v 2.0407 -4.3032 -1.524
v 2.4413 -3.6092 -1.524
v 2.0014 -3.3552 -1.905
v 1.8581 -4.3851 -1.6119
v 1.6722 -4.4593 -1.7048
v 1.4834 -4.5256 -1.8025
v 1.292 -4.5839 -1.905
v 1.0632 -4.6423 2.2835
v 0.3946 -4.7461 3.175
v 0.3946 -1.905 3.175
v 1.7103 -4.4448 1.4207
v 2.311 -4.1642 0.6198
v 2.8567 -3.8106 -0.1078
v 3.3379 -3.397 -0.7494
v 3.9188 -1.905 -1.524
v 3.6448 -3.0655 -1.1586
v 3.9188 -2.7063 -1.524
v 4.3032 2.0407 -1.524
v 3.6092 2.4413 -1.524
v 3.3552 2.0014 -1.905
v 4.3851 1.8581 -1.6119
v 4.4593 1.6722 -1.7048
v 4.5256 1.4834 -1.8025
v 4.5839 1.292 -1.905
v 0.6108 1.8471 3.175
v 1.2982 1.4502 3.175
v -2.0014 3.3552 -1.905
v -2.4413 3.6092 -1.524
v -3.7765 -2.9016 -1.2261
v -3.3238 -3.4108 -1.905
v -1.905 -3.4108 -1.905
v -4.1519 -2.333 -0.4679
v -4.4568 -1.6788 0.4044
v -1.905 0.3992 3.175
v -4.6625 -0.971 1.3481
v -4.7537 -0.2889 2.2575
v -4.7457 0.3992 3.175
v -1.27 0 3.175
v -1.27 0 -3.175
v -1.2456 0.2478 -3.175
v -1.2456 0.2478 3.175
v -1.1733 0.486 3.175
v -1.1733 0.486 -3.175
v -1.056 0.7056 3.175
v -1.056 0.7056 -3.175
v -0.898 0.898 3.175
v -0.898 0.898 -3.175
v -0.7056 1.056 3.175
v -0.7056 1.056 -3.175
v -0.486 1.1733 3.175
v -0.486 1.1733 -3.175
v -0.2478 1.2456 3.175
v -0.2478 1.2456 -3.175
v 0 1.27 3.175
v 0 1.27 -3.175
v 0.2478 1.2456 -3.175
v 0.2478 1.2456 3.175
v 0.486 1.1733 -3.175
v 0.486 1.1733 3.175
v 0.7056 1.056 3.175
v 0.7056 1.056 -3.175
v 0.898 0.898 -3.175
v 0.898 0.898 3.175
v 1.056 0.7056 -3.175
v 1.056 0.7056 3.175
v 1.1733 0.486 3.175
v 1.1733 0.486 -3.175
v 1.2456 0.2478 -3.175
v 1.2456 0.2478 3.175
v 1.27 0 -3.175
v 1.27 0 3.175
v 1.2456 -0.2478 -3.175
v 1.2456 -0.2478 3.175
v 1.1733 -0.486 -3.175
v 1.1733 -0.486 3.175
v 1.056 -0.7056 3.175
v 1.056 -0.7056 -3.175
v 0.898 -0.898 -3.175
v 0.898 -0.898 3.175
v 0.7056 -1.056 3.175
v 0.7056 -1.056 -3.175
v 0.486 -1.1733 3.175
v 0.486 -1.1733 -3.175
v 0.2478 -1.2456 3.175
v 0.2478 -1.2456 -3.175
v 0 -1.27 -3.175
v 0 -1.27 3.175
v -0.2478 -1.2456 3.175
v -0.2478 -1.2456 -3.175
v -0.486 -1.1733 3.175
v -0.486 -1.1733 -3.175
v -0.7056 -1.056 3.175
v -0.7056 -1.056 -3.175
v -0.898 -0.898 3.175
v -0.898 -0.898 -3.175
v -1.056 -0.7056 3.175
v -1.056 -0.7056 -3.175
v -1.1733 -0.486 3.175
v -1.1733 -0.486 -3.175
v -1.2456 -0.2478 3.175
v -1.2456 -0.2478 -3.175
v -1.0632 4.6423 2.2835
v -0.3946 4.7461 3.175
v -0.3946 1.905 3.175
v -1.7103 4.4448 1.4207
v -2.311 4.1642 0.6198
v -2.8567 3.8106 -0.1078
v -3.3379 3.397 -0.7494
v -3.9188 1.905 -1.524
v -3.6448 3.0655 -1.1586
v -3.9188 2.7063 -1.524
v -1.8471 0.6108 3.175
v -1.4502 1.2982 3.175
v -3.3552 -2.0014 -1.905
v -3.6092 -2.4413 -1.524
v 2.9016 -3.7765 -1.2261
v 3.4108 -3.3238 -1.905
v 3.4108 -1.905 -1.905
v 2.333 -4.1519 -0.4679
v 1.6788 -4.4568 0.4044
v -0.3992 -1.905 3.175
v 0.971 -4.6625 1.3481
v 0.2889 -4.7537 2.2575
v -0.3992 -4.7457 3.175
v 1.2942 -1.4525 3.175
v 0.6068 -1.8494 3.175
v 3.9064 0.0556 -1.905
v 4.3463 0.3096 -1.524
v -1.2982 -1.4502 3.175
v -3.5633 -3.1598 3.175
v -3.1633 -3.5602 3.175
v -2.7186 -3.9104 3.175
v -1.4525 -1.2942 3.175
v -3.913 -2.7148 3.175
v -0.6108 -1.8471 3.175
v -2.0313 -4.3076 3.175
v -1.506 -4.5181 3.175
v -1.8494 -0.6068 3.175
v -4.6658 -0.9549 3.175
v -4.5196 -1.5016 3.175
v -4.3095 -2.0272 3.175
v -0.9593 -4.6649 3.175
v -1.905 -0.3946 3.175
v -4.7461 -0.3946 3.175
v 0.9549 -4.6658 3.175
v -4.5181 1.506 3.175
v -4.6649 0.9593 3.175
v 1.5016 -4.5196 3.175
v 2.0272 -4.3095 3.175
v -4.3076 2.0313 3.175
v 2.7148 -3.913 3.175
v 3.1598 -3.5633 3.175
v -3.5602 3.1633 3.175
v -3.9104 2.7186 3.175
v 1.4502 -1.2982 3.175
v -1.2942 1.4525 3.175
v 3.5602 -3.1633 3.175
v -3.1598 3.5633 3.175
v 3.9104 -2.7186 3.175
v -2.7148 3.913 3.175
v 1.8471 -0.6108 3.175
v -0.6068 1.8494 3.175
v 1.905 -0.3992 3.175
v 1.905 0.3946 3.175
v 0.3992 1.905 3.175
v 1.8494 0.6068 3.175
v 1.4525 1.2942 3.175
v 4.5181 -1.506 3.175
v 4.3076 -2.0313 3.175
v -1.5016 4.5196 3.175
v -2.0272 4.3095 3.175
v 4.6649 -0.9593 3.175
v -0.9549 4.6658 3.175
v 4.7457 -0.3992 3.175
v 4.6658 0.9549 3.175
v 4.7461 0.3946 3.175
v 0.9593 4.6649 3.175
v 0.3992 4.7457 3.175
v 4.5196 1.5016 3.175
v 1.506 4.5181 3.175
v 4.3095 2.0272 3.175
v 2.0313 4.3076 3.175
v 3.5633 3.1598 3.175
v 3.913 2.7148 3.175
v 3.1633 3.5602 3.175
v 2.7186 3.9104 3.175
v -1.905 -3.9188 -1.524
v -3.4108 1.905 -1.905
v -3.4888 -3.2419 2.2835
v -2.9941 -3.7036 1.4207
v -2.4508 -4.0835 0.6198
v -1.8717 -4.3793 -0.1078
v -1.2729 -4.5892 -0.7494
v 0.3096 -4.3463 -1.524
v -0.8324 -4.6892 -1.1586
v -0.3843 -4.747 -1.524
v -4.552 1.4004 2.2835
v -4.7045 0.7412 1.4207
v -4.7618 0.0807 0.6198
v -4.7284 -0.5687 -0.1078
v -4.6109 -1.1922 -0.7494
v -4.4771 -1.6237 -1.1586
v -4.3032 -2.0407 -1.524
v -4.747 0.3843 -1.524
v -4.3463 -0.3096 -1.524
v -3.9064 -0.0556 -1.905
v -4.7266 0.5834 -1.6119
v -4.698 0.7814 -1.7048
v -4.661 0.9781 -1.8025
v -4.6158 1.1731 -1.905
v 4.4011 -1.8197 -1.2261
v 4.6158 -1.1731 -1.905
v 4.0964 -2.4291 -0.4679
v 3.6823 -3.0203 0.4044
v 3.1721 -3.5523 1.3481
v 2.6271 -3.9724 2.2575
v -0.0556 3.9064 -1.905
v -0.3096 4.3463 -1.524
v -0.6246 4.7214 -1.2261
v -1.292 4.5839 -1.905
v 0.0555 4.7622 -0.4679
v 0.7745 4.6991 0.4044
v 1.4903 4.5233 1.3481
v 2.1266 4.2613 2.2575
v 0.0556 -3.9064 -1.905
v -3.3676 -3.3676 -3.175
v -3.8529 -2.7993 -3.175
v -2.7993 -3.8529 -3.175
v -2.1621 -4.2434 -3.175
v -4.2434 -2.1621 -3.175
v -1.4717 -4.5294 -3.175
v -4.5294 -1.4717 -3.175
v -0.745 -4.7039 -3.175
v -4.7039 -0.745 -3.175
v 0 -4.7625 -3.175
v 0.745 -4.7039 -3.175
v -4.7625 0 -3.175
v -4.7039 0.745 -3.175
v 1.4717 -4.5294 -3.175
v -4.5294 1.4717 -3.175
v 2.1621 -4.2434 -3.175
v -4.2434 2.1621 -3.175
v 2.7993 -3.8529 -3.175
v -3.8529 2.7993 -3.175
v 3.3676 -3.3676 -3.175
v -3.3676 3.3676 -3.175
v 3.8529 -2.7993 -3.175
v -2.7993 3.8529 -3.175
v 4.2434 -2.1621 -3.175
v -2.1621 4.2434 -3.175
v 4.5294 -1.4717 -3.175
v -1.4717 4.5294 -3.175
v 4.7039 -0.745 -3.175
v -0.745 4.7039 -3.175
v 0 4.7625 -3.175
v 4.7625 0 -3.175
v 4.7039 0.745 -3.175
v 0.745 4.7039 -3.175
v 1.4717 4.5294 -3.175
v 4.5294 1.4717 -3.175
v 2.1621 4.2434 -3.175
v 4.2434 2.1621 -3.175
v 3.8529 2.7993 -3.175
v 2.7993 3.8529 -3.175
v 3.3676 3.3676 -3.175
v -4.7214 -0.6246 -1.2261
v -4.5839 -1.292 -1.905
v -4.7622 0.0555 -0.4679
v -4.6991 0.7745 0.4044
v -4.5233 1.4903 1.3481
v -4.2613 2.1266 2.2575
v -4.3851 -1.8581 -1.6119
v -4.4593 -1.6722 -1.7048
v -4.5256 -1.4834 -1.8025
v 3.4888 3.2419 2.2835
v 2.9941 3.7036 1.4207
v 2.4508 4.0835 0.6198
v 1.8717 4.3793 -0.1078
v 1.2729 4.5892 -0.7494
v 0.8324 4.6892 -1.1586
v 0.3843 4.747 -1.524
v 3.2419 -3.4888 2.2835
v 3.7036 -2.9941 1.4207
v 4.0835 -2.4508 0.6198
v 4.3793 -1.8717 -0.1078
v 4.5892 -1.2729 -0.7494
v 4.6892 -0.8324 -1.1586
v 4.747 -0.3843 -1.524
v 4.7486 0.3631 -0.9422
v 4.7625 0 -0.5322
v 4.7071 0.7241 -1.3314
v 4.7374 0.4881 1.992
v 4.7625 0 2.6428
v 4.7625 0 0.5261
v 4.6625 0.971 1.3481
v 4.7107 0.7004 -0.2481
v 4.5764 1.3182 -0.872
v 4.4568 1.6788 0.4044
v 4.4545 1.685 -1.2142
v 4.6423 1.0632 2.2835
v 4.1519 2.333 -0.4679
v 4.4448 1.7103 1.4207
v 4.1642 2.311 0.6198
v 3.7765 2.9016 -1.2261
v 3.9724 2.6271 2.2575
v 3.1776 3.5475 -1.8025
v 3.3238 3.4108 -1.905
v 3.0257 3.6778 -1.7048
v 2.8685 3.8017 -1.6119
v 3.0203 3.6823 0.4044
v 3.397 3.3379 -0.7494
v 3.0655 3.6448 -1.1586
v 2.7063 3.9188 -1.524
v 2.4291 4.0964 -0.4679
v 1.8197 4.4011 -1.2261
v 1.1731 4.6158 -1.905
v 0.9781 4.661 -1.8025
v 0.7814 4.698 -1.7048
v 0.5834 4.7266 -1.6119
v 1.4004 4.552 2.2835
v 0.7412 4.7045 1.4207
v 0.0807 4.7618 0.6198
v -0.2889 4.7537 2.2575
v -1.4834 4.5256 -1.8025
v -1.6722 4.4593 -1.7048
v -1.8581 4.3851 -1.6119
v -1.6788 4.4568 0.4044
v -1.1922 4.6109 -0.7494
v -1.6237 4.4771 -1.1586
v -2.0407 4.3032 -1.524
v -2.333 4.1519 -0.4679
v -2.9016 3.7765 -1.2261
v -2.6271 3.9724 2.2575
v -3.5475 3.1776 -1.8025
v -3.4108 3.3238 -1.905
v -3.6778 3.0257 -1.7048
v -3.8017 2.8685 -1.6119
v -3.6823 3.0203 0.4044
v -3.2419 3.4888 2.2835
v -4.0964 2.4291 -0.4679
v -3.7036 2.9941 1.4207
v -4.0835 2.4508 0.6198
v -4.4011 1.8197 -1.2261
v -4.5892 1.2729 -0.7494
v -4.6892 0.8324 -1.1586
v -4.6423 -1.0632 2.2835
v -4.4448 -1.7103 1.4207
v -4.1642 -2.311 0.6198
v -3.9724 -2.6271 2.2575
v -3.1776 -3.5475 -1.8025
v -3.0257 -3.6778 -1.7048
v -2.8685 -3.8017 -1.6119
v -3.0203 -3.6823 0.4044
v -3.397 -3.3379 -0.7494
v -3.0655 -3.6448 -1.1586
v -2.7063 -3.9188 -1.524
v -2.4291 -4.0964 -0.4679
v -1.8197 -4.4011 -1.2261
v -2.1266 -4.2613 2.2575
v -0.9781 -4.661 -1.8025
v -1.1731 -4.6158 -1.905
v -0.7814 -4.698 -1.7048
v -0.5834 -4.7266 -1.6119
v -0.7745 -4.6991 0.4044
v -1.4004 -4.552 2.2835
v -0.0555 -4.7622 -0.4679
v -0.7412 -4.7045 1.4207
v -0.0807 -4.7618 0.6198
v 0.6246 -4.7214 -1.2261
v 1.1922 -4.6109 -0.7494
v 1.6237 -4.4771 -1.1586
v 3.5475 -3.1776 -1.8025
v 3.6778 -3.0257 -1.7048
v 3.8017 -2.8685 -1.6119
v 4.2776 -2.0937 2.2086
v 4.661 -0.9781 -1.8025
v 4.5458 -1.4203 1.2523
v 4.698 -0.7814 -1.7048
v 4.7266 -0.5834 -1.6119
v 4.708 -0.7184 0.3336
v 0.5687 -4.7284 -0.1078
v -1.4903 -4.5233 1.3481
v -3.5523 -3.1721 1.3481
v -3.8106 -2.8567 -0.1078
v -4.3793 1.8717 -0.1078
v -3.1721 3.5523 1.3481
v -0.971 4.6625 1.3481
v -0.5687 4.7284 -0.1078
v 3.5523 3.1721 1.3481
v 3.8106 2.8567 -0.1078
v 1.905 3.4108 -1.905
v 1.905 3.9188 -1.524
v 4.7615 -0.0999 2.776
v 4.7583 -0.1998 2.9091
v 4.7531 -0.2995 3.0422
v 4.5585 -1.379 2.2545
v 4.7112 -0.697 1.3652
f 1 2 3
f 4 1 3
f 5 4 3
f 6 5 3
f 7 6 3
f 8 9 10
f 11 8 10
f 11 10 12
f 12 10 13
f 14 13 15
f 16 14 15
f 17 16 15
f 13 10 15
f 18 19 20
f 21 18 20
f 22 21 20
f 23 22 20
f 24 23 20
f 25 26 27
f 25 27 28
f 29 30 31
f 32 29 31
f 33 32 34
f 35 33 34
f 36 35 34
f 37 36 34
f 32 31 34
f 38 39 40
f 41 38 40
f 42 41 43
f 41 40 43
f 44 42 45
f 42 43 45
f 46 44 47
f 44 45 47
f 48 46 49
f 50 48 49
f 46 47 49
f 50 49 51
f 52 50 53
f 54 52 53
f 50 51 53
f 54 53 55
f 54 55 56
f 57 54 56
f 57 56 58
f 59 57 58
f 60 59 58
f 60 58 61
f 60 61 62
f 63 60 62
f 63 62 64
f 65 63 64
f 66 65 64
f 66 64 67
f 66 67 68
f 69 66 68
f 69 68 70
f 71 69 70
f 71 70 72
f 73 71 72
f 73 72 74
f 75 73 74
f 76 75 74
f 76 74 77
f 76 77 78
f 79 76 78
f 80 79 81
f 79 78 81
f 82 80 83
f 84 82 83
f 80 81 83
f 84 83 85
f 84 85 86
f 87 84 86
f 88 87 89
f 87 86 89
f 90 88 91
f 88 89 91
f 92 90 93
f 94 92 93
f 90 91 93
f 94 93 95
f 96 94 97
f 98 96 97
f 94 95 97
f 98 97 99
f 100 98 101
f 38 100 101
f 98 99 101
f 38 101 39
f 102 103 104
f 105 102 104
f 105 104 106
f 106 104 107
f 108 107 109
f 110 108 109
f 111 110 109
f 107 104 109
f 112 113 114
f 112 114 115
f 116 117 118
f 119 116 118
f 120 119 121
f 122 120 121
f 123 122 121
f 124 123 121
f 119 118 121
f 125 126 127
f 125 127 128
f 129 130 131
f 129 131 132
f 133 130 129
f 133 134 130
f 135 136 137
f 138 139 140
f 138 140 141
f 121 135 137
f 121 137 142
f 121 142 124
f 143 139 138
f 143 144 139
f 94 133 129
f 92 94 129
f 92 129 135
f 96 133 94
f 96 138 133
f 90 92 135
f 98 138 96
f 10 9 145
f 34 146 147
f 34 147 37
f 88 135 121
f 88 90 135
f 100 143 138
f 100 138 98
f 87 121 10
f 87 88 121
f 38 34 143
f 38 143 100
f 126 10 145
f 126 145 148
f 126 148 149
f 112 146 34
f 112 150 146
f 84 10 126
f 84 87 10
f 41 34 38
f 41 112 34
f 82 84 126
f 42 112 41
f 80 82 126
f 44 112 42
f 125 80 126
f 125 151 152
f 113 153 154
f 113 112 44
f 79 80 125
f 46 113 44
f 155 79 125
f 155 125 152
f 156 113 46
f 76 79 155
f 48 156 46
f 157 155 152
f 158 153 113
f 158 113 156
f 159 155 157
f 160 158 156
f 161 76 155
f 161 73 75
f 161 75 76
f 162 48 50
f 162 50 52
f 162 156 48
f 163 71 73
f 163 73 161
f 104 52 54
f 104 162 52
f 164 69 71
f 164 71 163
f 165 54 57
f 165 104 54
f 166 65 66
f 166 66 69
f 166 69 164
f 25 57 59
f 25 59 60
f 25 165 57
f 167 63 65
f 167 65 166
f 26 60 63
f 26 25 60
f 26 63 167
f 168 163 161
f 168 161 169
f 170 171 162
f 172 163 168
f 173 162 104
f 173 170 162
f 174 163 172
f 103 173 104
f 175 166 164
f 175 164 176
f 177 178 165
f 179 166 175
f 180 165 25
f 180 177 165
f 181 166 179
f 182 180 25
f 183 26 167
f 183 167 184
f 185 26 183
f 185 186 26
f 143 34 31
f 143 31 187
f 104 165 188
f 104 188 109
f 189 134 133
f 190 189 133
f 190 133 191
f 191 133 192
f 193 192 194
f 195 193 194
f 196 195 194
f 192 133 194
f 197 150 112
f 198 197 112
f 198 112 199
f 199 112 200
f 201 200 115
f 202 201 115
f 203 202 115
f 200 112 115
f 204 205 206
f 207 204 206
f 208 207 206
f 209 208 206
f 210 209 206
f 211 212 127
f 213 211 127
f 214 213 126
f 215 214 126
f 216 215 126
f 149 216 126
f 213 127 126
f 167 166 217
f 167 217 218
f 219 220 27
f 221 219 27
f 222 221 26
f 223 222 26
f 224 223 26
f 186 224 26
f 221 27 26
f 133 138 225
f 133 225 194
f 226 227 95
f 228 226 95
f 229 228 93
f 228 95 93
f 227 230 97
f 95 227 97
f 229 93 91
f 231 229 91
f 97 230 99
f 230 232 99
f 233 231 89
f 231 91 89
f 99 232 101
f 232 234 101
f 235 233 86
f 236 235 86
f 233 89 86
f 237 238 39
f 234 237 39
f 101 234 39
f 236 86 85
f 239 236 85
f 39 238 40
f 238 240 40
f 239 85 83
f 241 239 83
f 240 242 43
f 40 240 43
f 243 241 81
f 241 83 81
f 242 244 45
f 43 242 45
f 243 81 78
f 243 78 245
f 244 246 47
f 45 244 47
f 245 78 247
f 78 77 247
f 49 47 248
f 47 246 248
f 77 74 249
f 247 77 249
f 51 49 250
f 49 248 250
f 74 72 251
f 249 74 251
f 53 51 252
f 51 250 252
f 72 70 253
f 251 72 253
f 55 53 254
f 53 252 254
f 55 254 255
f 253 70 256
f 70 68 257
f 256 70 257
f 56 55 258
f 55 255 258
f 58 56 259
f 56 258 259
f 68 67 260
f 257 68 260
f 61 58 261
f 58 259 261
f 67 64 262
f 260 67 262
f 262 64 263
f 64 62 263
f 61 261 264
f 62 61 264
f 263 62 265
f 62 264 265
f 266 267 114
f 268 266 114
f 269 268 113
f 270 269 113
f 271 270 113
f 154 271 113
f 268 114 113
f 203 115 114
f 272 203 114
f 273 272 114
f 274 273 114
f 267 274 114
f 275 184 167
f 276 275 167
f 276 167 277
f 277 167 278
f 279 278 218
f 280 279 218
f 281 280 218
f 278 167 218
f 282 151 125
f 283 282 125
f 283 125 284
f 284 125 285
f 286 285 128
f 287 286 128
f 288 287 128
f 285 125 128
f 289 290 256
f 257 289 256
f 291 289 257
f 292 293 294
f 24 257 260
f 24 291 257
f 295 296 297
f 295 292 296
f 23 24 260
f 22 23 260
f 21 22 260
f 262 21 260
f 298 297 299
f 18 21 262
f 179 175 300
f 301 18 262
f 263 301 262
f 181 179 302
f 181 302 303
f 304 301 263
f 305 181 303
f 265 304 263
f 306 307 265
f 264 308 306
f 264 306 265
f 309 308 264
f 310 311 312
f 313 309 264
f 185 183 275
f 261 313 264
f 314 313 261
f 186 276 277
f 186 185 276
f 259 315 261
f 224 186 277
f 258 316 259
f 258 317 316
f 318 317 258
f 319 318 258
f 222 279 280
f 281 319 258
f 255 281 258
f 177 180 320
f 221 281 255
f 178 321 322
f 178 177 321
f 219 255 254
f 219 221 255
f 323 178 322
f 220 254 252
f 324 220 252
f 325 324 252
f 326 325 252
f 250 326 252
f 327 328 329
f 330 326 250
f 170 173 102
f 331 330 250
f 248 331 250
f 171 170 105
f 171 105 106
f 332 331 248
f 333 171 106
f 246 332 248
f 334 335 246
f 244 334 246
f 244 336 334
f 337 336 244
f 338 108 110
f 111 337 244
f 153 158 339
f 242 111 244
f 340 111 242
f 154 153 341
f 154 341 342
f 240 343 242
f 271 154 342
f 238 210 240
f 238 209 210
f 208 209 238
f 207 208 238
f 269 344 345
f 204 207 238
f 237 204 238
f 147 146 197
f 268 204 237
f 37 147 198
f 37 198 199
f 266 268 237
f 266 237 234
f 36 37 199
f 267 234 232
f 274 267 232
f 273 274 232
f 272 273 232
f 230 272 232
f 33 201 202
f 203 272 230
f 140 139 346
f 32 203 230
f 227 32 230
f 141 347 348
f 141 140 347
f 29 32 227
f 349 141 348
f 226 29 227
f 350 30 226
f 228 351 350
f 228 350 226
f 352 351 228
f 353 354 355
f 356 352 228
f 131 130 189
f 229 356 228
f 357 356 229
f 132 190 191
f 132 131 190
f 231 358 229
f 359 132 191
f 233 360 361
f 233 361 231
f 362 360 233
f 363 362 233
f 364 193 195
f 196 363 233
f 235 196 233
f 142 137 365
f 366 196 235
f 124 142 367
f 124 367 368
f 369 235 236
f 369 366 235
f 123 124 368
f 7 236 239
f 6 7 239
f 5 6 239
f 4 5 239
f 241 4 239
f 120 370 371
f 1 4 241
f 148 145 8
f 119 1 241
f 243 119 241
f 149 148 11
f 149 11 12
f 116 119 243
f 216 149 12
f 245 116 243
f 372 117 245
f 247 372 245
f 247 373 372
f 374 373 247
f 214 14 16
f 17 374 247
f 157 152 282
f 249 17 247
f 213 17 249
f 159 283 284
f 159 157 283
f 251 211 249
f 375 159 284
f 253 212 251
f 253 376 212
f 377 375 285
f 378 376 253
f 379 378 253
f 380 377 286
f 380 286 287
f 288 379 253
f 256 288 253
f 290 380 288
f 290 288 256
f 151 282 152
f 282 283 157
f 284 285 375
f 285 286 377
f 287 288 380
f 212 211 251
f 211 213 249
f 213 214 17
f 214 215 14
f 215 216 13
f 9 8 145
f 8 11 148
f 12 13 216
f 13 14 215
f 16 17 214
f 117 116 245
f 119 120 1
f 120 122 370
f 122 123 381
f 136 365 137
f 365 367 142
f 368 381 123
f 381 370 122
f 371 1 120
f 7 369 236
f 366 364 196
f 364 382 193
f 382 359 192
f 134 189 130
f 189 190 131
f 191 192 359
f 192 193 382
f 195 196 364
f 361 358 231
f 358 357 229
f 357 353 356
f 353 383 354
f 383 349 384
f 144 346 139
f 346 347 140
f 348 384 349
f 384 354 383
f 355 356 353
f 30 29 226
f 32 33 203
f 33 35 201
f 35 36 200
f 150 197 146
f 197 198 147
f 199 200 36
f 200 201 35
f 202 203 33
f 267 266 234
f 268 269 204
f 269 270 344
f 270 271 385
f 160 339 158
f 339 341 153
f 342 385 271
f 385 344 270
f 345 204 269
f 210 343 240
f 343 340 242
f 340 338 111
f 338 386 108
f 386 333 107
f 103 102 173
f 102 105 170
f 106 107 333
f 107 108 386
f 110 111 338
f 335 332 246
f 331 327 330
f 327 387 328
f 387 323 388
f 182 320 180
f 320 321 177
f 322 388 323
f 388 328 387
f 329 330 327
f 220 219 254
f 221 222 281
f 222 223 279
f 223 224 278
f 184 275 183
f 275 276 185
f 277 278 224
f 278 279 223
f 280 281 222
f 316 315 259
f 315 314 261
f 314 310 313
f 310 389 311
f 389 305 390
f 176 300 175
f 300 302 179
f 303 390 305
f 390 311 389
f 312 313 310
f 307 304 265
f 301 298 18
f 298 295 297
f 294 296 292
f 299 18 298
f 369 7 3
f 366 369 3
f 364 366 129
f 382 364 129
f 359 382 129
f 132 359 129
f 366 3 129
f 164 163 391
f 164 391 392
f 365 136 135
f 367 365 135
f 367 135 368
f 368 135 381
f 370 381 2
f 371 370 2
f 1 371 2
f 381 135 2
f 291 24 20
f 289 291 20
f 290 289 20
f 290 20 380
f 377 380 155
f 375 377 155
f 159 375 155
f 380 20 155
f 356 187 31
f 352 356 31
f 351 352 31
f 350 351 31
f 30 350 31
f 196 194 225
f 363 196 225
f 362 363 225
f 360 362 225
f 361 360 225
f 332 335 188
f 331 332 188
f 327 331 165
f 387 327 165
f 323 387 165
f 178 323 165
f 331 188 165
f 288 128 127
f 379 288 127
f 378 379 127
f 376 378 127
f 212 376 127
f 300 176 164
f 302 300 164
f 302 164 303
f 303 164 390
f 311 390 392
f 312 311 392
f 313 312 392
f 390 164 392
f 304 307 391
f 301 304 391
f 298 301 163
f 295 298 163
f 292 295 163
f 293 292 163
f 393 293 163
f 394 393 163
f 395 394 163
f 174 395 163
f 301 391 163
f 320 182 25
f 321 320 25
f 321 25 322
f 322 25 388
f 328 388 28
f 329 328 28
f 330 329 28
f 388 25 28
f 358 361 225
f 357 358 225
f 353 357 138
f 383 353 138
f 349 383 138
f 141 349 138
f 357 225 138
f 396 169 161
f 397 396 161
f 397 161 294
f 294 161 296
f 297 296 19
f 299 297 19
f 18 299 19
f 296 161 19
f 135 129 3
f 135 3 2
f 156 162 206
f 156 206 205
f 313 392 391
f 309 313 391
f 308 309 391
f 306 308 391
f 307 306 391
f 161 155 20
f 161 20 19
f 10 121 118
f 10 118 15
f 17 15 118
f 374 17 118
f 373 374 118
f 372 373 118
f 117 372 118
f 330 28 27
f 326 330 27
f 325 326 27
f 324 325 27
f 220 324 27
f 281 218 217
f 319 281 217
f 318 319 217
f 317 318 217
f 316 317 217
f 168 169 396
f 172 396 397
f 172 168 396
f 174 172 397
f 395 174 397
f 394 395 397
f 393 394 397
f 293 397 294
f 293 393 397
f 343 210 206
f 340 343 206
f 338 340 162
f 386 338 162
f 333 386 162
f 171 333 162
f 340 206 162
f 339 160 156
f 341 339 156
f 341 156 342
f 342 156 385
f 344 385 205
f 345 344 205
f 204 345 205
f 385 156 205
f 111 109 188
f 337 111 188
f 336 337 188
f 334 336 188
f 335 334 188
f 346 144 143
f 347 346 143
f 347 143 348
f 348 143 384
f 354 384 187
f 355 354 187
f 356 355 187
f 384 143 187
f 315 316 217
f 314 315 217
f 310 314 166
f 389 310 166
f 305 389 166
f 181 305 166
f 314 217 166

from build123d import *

# Parameters (mm, degrees)
SKETCH2_R           = 4.7625
BOSS_EXTRUDE1_DEPTH = 3.175
SKETCH5_R           = 1.27
CUT_EXTRUDE1_DEPTH  = 7.35
CUT_EXTRUDE2_START  = 1.905
CUT_EXTRUDE2_DEPTH  = 3.8575
CIRPATTERN2_COUNT   = 12


with BuildPart() as part:
    # Sketch2 → Boss-Extrude1 (new body, symmetric)
    with BuildSketch(Plane.XY):
        Circle(SKETCH2_R)
    extrude(amount=BOSS_EXTRUDE1_DEPTH, both=True)

    # Sketch5 → Cut-Extrude1 (cut, through all)
    with BuildSketch(Plane(origin=(0, 0, -3.175), x_dir=(-1, 0, 0), z_dir=(0, 0, -1))):
        Circle(SKETCH5_R)
    extrude(amount=-CUT_EXTRUDE1_DEPTH, mode=Mode.SUBTRACT)

    # Sketch4_2 → Cut-Extrude2 (cut, through all)
    with BuildSketch(Plane(origin=(0, 0, 0), x_dir=(1, 0, 0), z_dir=(0, 1, 0)).offset(CUT_EXTRUDE2_START)):
        with BuildLine():
            Line((-0.108840568, -3.556), (-3.918840568, 1.524))
            Line((-3.918840568, 1.524), (-3.410840568, 1.905))
            Line((-3.410840568, 1.905), (0.399159432, -3.175))
            ThreePointArc((0.399159432, -3.175), (0.335659432, -3.6195), (-0.108840568, -3.556))
        make_face()
    cut_extrude2 = extrude(amount=CUT_EXTRUDE2_DEPTH, mode=Mode.SUBTRACT)

    # CirPattern2: Cut-Extrude2 ×12 about axis
    cirpattern2_axis = Axis((0, 0, 0), (0, 0, 1))
    for i in range(1, CIRPATTERN2_COUNT):
        add(cut_extrude2.rotate(cirpattern2_axis, i * 360 / CIRPATTERN2_COUNT), mode=Mode.SUBTRACT)


solid = part.part
